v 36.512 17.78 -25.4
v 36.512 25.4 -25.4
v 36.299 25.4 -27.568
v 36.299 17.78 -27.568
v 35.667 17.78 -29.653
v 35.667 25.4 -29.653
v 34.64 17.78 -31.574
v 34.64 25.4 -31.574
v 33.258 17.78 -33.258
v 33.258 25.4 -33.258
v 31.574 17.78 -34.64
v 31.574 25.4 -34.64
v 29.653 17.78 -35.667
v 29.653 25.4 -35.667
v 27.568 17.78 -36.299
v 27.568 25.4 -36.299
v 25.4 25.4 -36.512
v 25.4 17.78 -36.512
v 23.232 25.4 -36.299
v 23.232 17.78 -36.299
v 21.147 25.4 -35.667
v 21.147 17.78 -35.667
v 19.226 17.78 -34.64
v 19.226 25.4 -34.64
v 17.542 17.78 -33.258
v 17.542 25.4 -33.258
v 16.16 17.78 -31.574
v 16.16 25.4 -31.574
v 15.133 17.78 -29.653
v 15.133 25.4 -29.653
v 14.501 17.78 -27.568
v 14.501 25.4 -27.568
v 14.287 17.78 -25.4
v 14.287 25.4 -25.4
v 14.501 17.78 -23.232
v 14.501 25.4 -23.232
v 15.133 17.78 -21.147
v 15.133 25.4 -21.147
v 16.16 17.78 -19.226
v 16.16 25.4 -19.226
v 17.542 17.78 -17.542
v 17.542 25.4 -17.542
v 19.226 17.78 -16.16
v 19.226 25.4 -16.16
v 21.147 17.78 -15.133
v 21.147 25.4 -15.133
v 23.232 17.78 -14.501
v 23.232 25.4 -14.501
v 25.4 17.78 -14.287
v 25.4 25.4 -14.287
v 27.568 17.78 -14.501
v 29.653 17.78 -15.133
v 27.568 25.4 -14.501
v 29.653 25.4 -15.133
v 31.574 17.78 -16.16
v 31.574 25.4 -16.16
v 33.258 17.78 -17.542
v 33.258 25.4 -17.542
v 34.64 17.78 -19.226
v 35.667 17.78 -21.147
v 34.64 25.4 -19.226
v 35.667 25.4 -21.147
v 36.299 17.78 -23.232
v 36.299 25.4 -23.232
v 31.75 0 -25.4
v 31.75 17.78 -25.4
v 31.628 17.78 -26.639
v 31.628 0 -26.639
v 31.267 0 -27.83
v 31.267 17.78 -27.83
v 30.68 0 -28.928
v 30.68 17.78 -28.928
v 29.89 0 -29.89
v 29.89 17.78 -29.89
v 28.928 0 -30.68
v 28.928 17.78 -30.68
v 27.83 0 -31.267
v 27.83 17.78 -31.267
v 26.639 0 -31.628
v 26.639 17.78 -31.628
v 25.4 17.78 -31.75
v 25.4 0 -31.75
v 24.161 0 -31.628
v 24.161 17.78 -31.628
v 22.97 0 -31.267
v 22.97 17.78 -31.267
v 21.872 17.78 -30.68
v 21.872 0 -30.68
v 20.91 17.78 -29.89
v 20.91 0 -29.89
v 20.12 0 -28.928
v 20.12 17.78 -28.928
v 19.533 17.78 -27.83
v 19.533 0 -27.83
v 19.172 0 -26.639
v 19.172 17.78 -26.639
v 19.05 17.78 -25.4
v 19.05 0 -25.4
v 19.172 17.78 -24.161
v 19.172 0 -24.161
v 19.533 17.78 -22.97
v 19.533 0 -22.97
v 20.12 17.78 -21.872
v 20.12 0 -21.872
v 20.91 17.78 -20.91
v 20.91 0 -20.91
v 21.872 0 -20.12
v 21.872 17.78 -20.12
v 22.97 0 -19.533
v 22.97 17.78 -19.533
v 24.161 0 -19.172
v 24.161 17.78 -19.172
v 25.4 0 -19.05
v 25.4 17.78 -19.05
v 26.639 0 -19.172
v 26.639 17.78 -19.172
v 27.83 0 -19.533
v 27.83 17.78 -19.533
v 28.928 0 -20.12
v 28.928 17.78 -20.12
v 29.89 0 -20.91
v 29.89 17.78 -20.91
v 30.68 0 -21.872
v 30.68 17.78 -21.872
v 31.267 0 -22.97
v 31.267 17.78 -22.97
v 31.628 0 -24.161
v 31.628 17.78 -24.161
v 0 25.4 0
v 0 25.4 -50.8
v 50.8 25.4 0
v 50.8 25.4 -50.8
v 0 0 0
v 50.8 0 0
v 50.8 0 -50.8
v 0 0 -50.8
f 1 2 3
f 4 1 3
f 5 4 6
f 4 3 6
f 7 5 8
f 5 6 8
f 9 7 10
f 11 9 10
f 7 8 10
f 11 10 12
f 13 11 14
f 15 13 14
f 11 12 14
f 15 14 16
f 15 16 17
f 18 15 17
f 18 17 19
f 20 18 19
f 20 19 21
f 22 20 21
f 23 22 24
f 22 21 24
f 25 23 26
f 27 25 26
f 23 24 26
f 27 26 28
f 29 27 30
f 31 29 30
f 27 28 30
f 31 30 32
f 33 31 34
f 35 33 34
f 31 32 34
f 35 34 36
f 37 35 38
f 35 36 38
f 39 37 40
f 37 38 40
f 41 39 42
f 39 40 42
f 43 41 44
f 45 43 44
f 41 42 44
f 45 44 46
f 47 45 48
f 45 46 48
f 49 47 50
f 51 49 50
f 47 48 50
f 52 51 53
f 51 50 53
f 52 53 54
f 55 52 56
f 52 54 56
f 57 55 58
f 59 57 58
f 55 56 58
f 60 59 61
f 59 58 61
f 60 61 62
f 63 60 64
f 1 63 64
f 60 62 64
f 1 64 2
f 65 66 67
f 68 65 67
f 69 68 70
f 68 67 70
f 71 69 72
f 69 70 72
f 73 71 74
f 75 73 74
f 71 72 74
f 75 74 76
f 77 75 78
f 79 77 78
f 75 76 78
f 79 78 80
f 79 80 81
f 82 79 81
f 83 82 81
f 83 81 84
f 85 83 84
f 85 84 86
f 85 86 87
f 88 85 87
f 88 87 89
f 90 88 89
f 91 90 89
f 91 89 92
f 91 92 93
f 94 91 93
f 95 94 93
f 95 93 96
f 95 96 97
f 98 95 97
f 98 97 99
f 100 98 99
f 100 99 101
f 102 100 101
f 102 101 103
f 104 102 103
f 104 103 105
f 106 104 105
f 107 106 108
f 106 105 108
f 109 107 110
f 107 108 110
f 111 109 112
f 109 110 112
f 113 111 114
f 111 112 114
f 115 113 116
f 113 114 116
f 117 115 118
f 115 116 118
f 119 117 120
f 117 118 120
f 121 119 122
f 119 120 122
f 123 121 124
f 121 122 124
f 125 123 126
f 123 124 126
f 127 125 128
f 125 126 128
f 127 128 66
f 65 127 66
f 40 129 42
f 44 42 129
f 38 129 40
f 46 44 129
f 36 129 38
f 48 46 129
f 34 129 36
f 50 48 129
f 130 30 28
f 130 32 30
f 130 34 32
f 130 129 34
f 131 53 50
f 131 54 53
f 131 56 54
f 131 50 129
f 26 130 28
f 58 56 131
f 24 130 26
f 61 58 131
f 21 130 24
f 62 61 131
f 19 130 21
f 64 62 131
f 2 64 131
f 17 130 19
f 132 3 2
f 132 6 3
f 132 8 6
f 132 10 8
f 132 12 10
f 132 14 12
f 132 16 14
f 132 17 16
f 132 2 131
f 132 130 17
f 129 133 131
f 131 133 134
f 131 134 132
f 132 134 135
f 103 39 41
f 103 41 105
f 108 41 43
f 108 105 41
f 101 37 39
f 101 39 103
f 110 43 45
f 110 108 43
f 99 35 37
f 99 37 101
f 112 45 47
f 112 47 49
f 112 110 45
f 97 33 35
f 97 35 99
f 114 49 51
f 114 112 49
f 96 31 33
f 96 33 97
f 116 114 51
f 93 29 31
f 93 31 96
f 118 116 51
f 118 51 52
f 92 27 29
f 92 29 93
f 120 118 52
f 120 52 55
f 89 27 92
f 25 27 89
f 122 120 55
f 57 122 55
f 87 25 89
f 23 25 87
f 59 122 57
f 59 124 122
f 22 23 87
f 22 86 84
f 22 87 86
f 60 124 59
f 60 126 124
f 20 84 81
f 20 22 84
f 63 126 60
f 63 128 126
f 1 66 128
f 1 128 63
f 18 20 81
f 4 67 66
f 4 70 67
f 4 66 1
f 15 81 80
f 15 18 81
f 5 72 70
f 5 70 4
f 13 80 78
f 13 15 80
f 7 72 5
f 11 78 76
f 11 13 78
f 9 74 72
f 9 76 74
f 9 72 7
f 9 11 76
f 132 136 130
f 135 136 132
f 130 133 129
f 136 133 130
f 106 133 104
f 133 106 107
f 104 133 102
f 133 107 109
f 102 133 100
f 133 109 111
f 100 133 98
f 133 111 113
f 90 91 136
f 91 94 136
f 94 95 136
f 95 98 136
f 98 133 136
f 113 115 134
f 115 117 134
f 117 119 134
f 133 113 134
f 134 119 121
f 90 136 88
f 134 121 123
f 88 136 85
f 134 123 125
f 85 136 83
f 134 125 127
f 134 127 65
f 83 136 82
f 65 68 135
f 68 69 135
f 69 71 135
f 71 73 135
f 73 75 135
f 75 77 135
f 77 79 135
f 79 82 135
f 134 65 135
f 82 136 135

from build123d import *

# Parameters (mm, degrees)
SKETCH1_W           = 50.8
SKETCH1_H           = 50.8
BOSS_EXTRUDE1_DEPTH = 25.4
SKETCH6_R           = 6.35
CUT_EXTRUDE1_DEPTH  = 25.4
SKETCH7_R           = 11.1125
CUT_EXTRUDE2_DEPTH  = 7.62


with BuildPart() as part:
    # Sketch1 → Boss-Extrude1 (new body)
    with BuildSketch(Plane(origin=(0, 0, 0), x_dir=(1, 0, 0), z_dir=(0, 1, 0))):
        with Locations((25.4, 25.4)):
            Rectangle(SKETCH1_W, SKETCH1_H)
    extrude(amount=BOSS_EXTRUDE1_DEPTH)

    # Sketch6 → Cut-Extrude1 (cut)
    with BuildSketch(Plane(origin=(0, 25.4, 0), x_dir=(1, 0, 0), z_dir=(0, 1, 0))):
        with Locations((25.4, 25.4)):
            Circle(SKETCH6_R)
    extrude(amount=-CUT_EXTRUDE1_DEPTH, mode=Mode.SUBTRACT)

    # Sketch7 → Cut-Extrude2 (cut)
    with BuildSketch(Plane(origin=(0, 25.4, 0), x_dir=(1, 0, 0), z_dir=(0, 1, 0))):
        with Locations((25.4, 25.4)):
            Circle(SKETCH7_R)
    extrude(amount=-CUT_EXTRUDE2_DEPTH, mode=Mode.SUBTRACT)


solid = part.part
